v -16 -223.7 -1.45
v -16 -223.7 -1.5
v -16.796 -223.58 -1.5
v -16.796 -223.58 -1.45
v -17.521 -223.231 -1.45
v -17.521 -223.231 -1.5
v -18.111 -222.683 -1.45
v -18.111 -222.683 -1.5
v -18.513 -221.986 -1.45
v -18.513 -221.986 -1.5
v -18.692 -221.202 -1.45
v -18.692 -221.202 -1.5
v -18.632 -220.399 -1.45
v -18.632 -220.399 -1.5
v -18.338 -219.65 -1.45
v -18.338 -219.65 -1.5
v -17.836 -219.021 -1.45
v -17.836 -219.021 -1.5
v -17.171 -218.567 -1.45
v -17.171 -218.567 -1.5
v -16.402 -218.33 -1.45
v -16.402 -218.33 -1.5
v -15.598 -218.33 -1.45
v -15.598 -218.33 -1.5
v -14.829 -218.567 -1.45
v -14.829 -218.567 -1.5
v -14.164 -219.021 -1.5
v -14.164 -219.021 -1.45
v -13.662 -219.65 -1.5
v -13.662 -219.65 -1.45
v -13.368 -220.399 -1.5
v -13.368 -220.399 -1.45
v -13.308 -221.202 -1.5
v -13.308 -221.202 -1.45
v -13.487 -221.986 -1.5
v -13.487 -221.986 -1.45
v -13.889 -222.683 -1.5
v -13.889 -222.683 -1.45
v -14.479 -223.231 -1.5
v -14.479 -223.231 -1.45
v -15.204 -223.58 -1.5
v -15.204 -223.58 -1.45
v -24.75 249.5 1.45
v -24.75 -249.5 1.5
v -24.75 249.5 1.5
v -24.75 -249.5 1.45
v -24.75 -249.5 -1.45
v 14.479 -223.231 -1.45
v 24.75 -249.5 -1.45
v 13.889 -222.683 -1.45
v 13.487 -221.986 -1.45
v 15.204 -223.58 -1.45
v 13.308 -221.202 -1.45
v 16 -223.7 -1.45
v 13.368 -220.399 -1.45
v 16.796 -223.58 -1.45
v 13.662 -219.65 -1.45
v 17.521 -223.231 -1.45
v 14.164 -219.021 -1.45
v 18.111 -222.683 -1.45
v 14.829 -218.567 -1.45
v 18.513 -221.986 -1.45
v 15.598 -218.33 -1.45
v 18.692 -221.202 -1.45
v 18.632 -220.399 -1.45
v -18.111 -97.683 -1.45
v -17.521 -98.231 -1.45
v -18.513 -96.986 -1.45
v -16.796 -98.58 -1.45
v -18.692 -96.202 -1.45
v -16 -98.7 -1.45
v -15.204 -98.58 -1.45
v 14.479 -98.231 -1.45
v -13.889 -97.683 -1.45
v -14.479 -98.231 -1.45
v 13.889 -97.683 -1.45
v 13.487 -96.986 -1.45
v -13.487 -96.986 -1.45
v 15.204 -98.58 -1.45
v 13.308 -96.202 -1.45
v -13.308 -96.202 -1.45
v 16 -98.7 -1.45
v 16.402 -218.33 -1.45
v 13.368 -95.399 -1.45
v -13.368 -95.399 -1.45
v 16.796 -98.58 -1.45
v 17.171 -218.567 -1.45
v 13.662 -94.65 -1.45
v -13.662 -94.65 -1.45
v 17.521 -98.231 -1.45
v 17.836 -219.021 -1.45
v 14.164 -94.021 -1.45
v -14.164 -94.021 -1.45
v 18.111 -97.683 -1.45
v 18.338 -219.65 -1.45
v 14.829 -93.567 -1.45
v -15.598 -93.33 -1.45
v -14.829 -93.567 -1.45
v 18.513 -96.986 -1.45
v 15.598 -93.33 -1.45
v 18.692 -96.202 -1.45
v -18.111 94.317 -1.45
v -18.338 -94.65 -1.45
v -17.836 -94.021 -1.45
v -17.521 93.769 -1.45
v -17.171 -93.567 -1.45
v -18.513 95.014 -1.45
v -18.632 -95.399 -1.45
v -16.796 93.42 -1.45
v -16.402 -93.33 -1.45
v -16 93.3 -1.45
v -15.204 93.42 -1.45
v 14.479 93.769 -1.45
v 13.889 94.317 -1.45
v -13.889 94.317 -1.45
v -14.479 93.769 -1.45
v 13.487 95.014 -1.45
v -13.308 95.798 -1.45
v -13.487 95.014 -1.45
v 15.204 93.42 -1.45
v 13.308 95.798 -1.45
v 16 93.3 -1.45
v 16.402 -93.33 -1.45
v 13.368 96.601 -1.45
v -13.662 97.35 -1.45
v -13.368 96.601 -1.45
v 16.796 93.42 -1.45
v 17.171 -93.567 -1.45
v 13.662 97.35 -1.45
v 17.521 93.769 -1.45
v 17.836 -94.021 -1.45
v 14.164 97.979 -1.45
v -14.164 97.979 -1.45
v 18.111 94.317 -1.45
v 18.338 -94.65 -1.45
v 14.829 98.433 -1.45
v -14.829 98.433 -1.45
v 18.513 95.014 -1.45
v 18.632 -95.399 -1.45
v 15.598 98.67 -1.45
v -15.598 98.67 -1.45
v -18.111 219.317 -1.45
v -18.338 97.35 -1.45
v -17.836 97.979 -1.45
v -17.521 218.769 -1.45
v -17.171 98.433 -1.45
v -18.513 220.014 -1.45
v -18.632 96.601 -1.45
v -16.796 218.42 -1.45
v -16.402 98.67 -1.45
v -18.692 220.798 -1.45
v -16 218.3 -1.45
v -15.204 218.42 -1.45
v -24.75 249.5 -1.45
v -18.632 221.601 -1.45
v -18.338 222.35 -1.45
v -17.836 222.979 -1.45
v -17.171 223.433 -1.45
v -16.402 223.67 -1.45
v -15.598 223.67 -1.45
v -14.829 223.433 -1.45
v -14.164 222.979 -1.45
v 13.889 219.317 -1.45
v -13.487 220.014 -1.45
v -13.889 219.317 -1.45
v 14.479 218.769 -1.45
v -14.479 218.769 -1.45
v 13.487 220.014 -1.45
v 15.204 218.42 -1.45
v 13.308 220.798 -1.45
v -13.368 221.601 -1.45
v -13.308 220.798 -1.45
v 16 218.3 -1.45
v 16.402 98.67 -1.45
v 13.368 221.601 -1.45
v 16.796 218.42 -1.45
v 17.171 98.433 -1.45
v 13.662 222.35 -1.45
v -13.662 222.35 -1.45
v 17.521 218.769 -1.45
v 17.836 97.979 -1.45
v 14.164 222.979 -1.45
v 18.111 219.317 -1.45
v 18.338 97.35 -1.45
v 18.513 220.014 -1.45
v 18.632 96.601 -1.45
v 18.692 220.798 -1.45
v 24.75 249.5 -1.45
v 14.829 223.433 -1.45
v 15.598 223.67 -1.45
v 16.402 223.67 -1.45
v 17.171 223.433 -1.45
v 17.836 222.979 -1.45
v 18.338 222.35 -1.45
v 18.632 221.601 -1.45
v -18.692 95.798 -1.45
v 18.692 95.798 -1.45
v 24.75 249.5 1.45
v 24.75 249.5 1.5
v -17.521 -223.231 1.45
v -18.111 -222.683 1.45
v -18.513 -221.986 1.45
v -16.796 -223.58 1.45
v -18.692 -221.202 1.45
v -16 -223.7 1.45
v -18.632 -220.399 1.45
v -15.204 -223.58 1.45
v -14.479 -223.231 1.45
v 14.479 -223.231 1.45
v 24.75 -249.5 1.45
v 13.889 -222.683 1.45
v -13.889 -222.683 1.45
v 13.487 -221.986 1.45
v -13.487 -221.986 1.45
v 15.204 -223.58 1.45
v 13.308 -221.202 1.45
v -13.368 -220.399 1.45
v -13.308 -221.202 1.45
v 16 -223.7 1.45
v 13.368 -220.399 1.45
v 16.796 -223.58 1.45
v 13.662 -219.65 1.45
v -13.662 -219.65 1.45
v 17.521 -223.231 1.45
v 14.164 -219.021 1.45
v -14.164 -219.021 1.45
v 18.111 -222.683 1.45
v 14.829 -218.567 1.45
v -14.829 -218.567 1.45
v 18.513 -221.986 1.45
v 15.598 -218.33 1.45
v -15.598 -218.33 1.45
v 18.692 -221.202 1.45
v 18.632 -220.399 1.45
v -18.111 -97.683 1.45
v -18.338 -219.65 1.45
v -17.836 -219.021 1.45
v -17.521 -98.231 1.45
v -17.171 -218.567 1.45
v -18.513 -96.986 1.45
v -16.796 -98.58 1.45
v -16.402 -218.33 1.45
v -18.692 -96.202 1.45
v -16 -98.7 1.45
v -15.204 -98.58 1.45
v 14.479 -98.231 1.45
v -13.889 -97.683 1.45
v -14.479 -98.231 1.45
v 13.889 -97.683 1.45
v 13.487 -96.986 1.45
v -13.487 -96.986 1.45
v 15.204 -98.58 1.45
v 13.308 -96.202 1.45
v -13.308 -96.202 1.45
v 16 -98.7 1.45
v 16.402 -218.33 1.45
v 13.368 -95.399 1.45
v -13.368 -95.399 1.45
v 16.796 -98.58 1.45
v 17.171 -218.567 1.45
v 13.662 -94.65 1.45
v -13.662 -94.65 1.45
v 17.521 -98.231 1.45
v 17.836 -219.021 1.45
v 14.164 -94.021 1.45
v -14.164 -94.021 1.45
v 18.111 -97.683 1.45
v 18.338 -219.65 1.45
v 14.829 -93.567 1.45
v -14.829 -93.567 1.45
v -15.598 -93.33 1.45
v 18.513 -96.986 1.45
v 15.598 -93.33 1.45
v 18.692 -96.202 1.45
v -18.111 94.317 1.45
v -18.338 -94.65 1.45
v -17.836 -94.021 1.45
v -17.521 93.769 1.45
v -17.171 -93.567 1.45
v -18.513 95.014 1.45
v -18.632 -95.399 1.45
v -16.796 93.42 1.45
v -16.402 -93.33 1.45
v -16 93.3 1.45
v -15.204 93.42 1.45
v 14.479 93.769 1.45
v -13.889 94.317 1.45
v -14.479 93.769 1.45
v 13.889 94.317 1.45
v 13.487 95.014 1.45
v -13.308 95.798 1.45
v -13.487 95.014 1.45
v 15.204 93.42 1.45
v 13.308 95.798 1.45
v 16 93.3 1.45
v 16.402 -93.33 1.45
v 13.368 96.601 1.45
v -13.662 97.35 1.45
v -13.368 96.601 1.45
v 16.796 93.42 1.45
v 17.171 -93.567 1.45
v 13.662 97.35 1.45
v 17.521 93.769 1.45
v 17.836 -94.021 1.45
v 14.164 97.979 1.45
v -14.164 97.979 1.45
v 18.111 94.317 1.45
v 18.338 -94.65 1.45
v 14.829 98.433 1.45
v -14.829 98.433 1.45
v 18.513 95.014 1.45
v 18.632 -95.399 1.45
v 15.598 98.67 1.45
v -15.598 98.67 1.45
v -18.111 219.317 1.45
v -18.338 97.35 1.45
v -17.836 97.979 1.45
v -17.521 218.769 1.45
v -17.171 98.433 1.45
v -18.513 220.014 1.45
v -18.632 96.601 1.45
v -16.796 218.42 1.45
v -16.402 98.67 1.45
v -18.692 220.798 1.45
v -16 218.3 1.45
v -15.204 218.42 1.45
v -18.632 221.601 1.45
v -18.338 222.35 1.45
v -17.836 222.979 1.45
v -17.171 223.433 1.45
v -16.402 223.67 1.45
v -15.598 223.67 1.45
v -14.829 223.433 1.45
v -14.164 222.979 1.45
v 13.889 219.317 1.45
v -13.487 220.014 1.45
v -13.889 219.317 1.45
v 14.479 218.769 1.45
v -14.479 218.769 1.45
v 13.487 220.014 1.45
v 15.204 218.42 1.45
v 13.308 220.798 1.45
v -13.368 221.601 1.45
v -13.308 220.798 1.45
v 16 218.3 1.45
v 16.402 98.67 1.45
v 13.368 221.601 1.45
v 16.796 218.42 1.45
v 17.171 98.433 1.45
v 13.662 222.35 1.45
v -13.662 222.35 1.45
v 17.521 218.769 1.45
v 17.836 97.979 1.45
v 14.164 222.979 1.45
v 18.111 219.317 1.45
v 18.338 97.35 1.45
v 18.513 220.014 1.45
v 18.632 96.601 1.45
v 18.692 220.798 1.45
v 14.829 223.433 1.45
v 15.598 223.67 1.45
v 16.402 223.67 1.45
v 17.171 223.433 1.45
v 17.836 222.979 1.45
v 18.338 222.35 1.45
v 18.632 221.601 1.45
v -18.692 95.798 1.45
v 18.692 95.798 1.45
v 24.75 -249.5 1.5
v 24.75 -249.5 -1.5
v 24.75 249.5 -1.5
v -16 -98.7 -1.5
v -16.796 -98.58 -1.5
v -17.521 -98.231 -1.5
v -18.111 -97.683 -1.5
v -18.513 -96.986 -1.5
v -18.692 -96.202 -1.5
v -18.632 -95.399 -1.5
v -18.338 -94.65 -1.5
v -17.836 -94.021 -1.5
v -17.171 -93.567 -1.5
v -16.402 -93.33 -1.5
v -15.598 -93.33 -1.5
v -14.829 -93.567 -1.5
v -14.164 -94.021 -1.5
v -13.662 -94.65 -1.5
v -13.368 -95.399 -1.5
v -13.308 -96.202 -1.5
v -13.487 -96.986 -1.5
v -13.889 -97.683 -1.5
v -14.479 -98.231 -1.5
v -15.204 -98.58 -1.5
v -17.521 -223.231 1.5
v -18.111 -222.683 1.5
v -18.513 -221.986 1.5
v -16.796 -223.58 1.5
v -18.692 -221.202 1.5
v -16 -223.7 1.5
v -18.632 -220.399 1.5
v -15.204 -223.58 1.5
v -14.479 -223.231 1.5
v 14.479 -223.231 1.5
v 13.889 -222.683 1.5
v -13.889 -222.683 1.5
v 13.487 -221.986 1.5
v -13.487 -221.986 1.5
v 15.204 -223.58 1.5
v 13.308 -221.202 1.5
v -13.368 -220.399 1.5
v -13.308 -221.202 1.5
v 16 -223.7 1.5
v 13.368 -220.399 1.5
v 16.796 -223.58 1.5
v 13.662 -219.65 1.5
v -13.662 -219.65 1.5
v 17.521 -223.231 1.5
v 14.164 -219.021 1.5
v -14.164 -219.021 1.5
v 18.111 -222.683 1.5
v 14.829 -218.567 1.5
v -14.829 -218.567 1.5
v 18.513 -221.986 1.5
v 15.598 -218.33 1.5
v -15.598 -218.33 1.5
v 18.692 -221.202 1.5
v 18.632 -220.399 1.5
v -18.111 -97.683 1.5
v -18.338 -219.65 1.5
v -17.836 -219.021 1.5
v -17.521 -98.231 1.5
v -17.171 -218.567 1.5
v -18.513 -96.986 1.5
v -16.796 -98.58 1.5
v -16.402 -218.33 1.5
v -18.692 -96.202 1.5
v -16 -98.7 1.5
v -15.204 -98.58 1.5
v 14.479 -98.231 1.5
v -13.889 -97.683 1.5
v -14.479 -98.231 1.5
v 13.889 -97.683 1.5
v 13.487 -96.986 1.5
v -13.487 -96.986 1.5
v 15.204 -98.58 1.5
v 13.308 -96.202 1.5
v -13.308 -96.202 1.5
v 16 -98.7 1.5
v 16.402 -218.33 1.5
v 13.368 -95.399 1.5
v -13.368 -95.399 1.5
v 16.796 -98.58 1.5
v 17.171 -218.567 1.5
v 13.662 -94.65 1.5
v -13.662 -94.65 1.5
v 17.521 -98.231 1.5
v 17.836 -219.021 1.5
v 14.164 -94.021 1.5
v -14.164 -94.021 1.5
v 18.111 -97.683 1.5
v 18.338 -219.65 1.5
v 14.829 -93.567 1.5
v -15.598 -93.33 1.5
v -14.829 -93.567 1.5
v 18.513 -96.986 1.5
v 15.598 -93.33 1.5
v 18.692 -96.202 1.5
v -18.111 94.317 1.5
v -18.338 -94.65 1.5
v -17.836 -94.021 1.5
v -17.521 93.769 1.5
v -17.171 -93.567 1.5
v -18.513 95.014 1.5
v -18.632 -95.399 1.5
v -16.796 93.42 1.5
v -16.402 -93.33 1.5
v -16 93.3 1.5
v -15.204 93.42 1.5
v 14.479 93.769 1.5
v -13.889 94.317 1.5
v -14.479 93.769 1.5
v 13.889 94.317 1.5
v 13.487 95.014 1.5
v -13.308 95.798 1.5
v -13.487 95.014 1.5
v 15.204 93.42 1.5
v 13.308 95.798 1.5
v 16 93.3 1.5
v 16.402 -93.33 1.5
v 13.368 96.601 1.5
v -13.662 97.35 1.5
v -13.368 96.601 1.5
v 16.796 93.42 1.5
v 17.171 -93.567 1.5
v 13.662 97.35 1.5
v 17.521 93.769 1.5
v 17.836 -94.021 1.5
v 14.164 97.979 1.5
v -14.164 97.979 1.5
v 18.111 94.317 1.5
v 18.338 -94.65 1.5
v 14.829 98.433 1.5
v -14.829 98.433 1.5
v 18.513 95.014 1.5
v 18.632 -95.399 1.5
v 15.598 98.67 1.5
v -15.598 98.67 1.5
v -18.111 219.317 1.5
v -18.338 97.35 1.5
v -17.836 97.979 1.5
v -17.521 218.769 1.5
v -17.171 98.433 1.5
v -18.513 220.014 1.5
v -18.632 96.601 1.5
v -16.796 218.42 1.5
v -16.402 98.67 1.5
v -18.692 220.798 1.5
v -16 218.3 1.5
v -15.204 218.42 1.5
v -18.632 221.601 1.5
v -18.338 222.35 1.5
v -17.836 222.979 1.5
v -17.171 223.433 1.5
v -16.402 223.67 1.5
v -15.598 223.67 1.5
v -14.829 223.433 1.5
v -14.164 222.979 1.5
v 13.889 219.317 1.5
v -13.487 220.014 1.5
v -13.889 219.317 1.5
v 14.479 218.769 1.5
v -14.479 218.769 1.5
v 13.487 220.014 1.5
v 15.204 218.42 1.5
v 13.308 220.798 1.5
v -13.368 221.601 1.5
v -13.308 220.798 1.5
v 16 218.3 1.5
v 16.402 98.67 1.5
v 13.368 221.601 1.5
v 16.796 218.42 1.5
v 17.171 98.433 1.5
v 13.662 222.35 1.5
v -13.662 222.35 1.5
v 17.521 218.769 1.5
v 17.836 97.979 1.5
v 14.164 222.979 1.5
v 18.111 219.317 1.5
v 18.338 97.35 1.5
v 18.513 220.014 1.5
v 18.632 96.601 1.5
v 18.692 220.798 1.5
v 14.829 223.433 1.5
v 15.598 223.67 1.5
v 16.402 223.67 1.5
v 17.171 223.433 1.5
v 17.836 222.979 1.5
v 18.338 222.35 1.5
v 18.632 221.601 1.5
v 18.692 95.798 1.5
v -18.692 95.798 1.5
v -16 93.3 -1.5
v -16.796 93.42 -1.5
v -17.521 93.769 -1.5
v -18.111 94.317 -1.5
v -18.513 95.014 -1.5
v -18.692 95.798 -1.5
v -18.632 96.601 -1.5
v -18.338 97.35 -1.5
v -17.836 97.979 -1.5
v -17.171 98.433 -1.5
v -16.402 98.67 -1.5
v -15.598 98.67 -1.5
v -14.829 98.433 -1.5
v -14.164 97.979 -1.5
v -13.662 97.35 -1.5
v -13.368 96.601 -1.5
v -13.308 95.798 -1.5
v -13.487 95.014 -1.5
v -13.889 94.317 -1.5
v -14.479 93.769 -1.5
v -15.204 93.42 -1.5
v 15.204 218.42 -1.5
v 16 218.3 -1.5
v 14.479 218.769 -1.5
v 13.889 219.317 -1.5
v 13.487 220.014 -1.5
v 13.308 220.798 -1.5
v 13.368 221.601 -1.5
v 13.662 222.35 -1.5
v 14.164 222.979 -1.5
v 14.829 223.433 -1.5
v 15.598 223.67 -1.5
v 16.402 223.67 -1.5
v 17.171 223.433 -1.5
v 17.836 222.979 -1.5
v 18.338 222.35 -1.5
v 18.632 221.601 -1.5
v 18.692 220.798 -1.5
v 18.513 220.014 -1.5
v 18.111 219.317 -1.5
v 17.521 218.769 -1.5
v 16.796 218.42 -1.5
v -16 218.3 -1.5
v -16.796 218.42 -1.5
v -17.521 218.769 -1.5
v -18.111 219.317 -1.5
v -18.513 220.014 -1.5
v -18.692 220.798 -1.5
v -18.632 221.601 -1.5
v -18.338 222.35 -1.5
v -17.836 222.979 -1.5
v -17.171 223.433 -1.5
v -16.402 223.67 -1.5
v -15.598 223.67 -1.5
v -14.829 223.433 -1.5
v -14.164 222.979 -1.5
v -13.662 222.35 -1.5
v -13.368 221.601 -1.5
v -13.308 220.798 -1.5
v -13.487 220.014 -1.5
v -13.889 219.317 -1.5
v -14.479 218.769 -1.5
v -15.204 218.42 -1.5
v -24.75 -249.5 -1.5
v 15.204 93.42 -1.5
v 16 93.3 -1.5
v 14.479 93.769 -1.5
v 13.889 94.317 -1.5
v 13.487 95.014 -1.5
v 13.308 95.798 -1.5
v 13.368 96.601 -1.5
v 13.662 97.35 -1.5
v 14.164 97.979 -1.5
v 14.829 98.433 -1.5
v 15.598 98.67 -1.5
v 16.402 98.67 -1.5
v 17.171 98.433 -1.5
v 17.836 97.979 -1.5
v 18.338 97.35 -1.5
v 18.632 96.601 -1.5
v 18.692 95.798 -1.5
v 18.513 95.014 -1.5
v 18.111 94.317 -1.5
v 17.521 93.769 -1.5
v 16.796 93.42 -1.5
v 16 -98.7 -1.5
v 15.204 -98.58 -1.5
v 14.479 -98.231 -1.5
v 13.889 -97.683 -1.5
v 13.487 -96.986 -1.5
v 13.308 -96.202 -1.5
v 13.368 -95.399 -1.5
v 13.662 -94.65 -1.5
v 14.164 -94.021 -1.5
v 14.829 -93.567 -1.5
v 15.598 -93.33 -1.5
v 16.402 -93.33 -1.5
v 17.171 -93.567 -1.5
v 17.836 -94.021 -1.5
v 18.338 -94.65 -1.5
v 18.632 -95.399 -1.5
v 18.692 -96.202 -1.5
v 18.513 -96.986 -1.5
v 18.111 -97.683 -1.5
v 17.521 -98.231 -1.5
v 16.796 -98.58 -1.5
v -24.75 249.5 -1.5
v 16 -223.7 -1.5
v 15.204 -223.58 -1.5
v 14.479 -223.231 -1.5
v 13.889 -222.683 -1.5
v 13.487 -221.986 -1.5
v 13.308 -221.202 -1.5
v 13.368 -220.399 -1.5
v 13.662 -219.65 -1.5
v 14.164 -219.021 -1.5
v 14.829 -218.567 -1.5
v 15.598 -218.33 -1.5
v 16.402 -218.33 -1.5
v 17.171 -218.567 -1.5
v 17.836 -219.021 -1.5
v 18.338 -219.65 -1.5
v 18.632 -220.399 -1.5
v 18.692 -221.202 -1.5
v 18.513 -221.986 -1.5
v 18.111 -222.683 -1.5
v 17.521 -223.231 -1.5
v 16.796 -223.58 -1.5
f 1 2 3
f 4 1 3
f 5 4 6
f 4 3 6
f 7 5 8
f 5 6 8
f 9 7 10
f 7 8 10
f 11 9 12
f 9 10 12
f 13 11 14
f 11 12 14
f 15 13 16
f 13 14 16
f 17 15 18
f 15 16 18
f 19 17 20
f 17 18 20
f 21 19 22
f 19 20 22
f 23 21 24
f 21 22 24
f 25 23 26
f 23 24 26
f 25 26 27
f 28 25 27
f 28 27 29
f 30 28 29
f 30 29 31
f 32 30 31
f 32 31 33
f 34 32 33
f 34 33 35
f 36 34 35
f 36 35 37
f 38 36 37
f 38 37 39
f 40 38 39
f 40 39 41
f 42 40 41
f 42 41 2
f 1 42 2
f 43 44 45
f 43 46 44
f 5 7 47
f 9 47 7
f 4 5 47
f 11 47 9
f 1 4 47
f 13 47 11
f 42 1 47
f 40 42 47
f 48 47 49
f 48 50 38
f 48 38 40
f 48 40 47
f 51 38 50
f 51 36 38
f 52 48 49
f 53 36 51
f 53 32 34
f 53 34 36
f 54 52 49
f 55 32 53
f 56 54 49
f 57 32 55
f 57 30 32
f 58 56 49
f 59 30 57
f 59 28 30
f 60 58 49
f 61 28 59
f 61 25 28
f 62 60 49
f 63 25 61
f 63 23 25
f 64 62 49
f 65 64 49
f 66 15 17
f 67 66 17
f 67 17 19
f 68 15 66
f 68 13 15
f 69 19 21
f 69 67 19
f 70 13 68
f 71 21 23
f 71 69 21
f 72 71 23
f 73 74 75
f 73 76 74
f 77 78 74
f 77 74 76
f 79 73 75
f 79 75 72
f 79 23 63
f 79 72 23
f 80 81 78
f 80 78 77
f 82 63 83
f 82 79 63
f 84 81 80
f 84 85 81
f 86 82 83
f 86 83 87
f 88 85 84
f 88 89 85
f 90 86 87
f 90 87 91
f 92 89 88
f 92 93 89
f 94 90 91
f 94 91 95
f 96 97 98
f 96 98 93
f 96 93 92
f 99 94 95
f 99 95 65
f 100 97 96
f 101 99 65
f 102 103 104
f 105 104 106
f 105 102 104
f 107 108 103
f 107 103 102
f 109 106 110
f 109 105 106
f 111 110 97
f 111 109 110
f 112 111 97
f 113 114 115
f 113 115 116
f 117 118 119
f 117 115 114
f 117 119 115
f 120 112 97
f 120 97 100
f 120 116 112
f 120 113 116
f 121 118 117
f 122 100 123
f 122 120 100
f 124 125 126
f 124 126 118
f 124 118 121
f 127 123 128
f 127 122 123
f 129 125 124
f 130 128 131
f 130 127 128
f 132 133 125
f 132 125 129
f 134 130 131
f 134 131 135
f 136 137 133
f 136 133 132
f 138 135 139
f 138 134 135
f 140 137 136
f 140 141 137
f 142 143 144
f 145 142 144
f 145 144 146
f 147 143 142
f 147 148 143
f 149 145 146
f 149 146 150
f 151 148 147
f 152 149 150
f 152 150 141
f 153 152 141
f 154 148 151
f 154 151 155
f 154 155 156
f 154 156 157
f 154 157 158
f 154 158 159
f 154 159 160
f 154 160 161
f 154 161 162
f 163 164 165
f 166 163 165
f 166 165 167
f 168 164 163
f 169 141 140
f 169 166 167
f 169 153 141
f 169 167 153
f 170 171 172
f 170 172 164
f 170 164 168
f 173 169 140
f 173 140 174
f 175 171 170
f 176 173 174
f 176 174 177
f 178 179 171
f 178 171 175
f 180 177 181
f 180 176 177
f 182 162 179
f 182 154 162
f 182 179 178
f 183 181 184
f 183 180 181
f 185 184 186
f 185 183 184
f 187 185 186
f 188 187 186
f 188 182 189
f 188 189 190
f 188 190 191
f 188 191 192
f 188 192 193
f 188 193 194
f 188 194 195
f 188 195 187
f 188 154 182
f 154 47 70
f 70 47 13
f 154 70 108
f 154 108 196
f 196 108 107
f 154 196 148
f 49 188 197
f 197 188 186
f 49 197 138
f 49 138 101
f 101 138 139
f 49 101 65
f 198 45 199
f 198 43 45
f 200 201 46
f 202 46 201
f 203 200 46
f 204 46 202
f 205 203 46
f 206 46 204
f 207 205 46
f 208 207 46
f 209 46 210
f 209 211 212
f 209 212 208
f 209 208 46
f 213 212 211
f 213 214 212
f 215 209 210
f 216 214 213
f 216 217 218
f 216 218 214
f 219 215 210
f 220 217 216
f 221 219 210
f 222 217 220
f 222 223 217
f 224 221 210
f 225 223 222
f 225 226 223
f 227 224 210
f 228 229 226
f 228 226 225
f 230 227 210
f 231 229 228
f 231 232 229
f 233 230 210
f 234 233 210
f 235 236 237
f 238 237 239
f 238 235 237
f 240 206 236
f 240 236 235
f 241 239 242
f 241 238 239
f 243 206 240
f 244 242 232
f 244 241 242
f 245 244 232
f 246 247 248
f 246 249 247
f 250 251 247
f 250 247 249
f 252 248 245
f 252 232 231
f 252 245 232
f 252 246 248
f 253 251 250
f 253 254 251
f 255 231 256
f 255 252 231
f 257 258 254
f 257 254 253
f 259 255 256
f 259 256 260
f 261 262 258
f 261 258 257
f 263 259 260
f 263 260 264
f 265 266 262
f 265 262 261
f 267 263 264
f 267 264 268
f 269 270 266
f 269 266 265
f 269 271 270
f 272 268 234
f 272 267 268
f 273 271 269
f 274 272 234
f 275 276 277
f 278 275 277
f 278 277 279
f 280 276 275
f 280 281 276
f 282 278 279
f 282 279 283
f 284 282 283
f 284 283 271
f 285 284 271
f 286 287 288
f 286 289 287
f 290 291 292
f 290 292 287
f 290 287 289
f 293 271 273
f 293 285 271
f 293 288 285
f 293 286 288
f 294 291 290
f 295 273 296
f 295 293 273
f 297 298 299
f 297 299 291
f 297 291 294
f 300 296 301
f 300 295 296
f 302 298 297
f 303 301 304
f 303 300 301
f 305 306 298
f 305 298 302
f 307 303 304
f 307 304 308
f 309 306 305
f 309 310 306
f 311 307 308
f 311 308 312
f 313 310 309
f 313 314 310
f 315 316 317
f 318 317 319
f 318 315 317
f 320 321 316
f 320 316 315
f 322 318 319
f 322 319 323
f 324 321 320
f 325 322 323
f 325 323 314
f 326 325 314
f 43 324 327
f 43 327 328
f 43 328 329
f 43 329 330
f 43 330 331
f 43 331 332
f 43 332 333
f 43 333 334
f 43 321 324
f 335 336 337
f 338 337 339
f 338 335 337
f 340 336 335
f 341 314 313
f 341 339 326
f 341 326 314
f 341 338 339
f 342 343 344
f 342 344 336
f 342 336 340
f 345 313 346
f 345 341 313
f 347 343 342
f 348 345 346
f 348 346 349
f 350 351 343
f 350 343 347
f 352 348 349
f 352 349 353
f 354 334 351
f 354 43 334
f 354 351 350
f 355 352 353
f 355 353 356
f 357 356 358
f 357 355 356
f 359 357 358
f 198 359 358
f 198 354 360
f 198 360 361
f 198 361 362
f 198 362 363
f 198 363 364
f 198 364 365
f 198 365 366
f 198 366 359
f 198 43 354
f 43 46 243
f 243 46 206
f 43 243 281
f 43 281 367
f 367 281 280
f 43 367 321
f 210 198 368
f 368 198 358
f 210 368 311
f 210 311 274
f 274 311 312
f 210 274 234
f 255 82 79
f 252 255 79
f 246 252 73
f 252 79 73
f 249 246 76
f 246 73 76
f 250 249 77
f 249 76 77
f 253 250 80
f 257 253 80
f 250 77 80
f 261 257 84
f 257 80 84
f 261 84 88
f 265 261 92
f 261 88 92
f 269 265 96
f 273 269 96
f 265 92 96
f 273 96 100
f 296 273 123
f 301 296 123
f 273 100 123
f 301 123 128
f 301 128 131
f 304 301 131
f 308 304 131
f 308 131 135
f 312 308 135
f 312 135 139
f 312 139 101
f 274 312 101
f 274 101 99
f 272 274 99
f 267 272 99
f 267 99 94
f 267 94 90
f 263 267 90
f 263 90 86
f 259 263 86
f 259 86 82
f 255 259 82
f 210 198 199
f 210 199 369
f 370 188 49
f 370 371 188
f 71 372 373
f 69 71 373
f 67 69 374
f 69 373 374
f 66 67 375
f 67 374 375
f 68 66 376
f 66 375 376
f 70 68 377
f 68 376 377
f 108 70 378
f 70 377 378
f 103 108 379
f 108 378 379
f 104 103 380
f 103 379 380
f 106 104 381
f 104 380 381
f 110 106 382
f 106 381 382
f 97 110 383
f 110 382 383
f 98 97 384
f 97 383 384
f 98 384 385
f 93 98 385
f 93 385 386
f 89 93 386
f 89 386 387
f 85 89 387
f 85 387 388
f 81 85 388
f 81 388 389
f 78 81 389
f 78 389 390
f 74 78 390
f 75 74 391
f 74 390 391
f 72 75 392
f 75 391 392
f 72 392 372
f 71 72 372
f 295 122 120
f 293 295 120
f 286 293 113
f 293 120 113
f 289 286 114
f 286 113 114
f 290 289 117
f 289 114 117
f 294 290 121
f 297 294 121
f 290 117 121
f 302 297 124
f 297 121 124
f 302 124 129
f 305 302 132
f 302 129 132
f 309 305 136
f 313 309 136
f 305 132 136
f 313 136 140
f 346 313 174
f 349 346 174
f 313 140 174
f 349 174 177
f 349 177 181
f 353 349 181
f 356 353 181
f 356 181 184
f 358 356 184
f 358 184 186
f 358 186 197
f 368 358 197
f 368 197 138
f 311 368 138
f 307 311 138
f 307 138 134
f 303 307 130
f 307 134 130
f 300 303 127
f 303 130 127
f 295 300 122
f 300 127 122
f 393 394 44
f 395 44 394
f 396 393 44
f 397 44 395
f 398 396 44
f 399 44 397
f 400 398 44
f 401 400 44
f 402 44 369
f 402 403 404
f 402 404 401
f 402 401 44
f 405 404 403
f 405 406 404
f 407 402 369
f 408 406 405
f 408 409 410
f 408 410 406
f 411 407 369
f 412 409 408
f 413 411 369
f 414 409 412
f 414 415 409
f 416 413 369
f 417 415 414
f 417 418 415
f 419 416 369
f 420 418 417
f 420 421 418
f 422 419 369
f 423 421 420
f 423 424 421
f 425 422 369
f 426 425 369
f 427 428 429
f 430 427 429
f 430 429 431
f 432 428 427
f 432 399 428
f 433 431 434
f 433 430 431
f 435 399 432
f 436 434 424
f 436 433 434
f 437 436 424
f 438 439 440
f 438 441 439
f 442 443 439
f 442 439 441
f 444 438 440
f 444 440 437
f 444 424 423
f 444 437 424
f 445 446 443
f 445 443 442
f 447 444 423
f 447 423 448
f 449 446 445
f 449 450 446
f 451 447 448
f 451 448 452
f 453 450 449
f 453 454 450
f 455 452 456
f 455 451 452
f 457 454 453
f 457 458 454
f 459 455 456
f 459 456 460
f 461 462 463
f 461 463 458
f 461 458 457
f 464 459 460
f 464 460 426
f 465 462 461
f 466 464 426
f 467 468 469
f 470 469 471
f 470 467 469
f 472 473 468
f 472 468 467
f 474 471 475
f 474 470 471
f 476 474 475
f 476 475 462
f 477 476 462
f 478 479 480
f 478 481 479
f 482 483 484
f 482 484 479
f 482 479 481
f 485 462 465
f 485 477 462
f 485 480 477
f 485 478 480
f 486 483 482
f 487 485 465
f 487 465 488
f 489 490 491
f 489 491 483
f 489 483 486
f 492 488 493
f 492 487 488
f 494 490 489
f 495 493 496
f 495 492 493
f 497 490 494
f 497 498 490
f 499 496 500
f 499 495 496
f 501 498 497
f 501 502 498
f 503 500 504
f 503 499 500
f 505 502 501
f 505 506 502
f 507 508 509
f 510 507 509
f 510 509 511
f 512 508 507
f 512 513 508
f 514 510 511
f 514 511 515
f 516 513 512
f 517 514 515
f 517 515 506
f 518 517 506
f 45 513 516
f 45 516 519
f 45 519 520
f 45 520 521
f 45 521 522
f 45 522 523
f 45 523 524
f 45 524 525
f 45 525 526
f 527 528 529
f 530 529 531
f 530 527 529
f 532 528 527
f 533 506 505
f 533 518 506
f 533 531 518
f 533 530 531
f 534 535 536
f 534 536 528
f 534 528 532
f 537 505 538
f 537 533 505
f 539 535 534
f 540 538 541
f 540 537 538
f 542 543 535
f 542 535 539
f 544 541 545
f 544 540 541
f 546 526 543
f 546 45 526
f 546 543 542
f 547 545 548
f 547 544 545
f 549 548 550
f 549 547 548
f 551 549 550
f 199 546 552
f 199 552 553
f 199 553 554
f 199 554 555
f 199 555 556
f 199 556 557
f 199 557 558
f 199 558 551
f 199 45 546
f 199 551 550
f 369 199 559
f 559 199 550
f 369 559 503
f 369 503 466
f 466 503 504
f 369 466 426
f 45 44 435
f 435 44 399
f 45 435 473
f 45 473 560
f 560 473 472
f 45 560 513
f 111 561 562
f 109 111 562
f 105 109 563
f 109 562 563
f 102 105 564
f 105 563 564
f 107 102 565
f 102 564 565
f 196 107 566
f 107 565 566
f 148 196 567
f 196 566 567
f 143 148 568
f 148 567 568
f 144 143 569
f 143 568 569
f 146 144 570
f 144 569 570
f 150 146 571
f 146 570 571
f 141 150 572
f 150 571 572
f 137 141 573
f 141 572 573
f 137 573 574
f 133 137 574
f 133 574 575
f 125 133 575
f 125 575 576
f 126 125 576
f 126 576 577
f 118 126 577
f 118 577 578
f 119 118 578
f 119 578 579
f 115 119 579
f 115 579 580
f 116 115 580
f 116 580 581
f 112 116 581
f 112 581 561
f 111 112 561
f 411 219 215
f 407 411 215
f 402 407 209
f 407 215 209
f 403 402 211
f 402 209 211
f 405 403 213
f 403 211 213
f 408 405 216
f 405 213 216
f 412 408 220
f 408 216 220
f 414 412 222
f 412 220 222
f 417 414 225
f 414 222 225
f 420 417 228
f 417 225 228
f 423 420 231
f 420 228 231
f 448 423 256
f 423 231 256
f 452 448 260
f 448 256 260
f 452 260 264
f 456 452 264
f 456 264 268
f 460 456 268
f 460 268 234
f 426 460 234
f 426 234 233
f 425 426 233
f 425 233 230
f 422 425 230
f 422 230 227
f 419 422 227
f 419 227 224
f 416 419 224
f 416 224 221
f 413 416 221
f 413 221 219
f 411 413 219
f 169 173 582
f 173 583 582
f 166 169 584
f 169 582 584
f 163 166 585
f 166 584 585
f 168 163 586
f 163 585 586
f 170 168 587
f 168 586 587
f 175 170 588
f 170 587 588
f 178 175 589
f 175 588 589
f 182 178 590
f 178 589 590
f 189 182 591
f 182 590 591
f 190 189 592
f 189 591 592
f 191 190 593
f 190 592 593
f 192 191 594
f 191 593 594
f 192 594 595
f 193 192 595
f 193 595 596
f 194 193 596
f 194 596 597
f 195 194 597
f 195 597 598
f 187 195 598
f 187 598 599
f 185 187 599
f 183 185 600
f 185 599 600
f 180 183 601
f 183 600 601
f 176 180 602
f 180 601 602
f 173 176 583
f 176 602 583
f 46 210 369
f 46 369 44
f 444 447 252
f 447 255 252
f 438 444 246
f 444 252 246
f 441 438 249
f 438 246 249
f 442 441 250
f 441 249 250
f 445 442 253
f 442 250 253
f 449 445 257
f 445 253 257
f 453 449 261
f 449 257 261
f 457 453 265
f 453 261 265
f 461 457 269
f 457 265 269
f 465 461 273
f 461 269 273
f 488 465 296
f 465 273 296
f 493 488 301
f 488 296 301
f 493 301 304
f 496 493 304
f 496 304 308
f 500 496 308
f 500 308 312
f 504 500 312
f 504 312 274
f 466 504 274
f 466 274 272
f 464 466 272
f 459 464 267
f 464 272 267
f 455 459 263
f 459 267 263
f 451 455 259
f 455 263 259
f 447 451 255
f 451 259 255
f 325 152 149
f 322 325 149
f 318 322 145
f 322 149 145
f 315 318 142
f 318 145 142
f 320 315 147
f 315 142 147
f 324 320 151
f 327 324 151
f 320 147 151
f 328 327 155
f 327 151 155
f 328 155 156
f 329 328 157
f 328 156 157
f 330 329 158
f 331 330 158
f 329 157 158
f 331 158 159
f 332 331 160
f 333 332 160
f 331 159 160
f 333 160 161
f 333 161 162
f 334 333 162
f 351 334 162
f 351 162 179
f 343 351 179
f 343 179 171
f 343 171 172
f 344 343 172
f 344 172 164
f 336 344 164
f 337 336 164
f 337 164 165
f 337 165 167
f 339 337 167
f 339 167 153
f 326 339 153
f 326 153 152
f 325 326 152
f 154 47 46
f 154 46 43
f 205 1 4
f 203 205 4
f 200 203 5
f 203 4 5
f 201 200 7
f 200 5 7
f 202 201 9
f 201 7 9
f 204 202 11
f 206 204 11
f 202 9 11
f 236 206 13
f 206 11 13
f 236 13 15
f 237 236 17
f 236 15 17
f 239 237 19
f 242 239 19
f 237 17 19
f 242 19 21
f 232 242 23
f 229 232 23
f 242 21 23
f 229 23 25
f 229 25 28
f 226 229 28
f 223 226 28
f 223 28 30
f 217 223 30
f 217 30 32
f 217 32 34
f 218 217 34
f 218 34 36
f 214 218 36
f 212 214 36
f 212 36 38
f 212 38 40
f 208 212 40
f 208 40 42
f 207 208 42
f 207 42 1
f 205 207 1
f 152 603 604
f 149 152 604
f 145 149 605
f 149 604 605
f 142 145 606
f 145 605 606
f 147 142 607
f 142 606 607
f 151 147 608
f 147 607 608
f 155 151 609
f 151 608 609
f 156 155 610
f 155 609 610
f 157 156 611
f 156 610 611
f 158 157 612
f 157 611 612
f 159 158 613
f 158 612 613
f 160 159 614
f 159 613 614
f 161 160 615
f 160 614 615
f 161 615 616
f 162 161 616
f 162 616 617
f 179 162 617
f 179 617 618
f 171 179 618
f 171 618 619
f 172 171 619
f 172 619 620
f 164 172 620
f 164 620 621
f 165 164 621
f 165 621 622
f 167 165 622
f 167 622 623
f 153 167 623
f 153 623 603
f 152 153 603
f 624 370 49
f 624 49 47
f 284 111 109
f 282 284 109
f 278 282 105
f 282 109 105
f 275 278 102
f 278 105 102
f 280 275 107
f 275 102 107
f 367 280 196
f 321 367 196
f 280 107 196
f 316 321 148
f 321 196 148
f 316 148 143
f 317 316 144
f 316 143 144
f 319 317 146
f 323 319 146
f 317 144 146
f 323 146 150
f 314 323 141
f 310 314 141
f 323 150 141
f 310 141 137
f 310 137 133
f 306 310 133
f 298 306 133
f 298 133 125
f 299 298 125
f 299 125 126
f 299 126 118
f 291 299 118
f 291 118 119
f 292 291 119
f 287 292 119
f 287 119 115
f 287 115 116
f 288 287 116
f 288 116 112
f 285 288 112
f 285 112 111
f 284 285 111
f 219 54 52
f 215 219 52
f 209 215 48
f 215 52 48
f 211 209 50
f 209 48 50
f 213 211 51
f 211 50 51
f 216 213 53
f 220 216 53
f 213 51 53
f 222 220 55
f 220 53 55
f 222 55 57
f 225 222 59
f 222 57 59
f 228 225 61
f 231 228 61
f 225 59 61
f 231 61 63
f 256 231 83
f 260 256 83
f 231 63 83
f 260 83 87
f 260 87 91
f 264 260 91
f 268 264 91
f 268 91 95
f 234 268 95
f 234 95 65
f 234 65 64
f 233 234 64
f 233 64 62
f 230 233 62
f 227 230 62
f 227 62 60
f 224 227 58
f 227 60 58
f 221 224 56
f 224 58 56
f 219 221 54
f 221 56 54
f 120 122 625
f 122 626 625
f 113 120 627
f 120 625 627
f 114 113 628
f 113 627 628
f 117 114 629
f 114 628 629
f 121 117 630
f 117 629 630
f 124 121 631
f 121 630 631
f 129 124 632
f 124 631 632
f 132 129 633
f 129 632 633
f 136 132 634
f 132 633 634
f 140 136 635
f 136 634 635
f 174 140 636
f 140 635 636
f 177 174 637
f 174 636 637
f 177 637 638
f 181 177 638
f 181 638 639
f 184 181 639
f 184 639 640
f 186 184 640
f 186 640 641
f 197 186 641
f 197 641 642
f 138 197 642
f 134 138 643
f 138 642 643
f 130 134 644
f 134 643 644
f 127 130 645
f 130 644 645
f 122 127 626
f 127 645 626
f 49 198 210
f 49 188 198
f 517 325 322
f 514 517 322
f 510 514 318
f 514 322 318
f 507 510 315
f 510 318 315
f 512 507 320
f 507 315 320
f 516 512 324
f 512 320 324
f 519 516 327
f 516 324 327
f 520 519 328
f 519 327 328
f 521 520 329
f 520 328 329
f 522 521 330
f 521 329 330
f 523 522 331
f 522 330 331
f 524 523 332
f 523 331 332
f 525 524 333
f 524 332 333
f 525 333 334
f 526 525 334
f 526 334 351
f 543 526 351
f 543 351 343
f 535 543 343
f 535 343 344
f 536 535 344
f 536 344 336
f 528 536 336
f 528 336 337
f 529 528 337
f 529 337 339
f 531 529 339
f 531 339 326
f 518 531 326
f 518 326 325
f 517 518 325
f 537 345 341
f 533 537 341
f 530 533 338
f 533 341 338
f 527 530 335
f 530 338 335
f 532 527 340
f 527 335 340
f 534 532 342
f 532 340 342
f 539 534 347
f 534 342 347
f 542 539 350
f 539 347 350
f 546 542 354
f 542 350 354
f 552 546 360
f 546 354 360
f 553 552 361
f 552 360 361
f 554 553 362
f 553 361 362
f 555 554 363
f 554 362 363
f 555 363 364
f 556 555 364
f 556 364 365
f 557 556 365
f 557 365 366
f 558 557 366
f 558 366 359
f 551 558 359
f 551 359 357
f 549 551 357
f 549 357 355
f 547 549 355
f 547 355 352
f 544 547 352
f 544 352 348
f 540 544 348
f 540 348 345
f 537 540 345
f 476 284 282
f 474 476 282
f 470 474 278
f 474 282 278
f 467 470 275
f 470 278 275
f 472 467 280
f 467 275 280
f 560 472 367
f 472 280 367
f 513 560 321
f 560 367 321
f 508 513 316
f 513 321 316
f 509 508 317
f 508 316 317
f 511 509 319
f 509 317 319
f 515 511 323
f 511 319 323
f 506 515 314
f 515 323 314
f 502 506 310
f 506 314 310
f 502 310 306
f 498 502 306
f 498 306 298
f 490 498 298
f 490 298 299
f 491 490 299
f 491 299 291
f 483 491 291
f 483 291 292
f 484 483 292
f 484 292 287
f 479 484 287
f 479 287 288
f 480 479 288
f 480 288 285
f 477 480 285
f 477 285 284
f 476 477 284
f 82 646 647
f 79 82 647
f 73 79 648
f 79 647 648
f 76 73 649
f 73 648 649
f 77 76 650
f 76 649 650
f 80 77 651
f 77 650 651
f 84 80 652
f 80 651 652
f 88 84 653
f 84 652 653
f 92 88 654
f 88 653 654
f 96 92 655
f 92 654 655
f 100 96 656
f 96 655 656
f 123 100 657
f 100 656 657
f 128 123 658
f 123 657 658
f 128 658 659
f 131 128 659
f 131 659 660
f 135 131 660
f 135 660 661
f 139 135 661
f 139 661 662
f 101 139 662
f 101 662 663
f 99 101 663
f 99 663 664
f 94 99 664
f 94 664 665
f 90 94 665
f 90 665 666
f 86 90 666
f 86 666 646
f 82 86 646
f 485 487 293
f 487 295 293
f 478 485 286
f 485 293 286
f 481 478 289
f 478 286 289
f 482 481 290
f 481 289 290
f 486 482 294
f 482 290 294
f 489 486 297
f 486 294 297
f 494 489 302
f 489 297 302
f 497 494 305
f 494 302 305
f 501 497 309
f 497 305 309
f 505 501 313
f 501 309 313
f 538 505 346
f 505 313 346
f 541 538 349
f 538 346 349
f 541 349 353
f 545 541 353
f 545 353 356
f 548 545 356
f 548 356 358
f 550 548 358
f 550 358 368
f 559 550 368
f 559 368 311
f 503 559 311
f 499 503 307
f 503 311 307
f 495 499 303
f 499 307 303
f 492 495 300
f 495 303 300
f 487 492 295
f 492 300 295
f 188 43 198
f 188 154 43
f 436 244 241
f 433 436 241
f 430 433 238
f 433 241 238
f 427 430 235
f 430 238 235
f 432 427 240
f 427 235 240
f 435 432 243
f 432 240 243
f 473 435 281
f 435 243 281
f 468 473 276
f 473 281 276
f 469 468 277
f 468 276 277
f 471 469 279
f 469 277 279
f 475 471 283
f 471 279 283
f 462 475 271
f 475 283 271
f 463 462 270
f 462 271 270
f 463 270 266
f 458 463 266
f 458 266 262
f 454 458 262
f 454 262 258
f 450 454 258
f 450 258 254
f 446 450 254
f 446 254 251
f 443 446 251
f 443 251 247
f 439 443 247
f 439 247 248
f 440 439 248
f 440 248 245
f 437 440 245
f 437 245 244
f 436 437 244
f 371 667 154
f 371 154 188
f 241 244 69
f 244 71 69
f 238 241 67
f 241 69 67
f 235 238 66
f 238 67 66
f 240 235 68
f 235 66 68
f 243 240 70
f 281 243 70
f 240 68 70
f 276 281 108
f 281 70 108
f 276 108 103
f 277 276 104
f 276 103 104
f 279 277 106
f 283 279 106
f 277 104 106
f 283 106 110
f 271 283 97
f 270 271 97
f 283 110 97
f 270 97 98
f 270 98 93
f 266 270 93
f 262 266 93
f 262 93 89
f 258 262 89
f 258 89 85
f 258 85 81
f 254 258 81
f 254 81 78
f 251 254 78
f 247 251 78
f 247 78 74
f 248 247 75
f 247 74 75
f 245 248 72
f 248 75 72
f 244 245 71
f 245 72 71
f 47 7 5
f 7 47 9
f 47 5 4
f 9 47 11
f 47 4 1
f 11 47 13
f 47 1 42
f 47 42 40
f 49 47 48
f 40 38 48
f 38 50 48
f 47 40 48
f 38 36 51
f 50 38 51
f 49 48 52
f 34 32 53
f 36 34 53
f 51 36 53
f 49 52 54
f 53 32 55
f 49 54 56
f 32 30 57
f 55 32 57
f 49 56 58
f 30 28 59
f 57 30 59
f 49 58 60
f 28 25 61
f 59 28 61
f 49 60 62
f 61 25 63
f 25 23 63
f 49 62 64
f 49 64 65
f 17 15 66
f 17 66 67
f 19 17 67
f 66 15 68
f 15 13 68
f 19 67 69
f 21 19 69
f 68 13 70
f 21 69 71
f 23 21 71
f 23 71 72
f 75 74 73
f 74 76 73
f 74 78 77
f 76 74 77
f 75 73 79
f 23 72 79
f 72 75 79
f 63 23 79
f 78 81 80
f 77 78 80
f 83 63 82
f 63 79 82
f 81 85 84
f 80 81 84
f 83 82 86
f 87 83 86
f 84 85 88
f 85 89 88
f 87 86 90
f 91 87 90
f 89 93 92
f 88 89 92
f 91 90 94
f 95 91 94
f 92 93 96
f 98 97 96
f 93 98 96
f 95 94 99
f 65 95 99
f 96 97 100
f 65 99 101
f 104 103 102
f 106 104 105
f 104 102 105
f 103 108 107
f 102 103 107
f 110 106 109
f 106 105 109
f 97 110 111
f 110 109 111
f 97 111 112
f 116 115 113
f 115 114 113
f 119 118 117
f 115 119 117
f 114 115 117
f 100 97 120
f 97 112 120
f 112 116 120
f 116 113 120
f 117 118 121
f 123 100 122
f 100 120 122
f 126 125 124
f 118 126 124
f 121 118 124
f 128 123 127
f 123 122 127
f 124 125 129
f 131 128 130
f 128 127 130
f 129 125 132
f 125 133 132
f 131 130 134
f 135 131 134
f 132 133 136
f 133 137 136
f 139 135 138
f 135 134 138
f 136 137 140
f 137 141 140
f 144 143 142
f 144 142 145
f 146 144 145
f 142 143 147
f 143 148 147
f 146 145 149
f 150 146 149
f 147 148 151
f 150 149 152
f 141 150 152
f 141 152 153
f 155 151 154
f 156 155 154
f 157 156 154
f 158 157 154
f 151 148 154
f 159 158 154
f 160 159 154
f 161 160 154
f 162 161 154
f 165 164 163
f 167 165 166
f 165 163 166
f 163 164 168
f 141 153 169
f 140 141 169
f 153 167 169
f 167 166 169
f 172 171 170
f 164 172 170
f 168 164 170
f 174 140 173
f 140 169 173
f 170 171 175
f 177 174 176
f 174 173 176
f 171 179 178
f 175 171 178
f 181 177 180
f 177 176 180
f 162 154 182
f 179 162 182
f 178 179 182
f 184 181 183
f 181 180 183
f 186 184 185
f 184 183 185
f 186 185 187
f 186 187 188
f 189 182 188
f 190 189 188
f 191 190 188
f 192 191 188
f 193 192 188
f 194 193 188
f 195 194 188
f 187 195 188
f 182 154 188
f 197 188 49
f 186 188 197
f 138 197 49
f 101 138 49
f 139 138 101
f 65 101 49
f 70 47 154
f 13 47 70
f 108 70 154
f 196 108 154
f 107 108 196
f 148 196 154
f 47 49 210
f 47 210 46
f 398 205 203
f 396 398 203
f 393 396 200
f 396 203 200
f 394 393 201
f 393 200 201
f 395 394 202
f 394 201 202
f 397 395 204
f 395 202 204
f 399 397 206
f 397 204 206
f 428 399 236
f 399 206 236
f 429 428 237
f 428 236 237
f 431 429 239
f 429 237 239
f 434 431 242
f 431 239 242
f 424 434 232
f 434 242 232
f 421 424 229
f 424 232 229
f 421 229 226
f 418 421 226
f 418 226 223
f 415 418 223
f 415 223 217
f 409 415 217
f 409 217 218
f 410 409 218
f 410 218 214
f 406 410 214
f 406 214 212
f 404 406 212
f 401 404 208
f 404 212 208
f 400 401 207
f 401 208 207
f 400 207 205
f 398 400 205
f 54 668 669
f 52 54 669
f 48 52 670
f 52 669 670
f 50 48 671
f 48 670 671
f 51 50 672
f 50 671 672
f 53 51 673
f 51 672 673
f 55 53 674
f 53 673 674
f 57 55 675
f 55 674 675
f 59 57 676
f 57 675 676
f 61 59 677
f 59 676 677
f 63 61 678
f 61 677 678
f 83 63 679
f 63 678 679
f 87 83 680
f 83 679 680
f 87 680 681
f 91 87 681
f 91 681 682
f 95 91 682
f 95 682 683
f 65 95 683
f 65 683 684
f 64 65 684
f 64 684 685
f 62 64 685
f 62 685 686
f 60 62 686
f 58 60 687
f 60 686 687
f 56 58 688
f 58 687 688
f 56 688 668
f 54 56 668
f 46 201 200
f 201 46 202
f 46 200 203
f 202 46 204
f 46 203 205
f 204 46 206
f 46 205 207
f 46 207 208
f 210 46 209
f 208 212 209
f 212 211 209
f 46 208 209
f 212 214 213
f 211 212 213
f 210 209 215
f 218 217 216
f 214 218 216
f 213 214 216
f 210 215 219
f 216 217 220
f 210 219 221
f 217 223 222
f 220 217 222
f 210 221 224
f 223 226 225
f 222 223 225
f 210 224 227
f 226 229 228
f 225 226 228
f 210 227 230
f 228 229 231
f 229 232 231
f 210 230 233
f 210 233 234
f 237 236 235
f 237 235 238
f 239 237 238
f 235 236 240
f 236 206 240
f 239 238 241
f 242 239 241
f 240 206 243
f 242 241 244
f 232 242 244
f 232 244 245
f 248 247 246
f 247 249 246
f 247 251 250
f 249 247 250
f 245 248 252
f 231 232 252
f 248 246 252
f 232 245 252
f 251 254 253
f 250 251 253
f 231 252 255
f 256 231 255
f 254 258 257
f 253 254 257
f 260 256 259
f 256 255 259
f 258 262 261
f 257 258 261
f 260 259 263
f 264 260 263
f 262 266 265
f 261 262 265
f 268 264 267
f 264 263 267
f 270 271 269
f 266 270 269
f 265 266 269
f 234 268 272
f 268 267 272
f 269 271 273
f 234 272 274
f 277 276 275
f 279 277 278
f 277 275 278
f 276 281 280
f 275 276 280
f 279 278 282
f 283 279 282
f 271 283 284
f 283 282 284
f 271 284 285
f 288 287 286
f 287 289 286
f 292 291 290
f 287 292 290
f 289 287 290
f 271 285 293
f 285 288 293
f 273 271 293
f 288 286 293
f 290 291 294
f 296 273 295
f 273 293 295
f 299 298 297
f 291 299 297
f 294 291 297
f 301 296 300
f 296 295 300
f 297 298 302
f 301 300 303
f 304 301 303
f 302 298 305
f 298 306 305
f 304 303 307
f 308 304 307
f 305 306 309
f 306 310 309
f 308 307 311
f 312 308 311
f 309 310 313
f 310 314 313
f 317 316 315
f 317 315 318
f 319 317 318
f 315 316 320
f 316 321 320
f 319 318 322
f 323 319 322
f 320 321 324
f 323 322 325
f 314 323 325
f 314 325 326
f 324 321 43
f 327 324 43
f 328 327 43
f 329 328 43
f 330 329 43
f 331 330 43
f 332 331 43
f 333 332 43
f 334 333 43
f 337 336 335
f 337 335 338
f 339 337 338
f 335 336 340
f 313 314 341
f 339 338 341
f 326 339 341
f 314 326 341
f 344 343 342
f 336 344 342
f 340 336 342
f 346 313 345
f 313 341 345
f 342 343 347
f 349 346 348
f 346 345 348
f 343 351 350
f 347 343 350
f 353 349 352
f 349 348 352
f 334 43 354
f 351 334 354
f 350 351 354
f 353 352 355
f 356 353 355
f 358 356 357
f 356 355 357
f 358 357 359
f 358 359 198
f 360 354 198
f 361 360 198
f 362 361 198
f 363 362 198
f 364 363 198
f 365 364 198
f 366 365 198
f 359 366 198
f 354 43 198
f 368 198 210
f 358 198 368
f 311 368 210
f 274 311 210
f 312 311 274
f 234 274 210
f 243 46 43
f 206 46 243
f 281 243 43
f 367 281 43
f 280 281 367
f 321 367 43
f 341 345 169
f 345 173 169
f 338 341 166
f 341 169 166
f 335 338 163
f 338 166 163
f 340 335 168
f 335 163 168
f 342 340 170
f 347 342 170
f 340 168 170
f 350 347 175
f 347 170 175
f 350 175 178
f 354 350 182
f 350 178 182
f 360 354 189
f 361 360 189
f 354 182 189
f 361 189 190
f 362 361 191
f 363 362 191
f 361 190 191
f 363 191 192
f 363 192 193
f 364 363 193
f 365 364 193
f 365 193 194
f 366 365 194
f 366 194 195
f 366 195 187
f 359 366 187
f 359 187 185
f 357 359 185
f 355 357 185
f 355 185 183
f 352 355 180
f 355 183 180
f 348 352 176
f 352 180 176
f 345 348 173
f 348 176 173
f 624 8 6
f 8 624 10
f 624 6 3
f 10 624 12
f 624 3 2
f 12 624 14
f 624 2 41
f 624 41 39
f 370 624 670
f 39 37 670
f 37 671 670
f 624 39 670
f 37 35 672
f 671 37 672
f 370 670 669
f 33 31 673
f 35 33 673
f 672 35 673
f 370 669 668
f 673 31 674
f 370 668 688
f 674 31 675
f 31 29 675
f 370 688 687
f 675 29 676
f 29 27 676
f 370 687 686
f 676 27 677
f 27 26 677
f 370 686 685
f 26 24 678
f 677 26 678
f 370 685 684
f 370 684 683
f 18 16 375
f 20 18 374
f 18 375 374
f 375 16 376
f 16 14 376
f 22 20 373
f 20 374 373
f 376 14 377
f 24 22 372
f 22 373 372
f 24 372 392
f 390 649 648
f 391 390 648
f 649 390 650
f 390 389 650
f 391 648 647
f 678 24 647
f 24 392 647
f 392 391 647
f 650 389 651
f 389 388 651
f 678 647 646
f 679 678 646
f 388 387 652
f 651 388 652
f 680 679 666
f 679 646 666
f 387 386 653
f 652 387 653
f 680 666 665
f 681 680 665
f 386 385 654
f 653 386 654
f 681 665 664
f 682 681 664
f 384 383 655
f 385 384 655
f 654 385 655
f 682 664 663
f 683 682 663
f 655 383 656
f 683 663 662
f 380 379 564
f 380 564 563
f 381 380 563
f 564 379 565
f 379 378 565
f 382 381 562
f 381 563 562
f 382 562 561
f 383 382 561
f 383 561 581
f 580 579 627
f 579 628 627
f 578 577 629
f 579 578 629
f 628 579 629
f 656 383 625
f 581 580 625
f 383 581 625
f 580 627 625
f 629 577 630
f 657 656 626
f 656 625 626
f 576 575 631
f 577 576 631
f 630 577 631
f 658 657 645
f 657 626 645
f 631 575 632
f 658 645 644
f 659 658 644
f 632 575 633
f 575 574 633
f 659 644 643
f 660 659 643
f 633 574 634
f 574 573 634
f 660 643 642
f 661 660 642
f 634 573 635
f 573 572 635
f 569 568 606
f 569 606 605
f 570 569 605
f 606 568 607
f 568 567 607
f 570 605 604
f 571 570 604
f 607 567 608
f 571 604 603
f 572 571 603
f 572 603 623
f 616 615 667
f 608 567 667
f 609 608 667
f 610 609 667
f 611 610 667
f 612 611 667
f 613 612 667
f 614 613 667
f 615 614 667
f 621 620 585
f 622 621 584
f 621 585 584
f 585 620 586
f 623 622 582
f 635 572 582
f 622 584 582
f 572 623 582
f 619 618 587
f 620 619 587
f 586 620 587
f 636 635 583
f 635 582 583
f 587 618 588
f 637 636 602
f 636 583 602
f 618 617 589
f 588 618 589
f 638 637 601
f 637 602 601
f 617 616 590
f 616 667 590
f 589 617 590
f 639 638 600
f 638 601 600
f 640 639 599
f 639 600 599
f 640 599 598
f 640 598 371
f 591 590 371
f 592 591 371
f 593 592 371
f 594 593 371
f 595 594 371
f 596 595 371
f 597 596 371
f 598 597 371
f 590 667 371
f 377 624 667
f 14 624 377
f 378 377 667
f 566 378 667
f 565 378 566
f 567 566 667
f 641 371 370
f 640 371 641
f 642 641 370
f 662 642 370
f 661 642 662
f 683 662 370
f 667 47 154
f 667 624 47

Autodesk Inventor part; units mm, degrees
ref_plane "YZ Plane" through (0, 0, 0) normal (1, 0, 0) x (0, 1, 0)
ref_plane "XZ Plane" through (0, 0, 0) normal (0, 1, 0) x (-1, 0, 0)
ref_plane "XY Plane" through (0, 0, 0) normal (0, 0, 1) x (1, 0, 0)
sketch "Sketch1" plane through (0, 0, 0) normal (0, 0, 1) x (1, 0, 0)
  line L0 (24.75, -249.5) -> (-24.75, -249.5)
  line L1 (-24.75, -249.5) -> (-24.75, 249.5)
  line L2 (-24.75, 249.5) -> (24.75, 249.5)
  line L3 (24.75, 249.5) -> (24.75, -249.5)
  line L4 (24.75, -249.5) -> (-24.75, 249.5) construction
  line L5 (-24.75, -249.5) -> (24.75, 249.5) construction
  point P0 (0, 0)
  dimension "d0" = 49.5
  dimension "d1" = 499
extrude "Extrusion1" add sketch "Sketch1" along normal mid plane 3
extrude "Extrusion2" cut sketch "Sketch1" along normal mid plane 2.9
extrude "Extrusion3" add sketch "Sketch1" along normal mid plane 2.9 separate body
sketch "Sketch2" plane through (0, 0, 1.5) normal (0, 0, 1) x (1, 0, 0)
  line L0 (16, -221) -> (-16, -221)
  line L1 (-16, -221) -> (-16, 221)
  line L2 (-16, 221) -> (16, 221)
  line L3 (16, 221) -> (16, -221)
  line L4 (16, -221) -> (-16, 221) construction
  line L5 (-16, -221) -> (16, 221) construction
  line L6 (16, -96) -> (-16, -96)
  line L7 (-16, -96) -> (-16, 96)
  line L8 (-16, 96) -> (16, 96)
  line L9 (16, 96) -> (16, -96)
  line L10 (16, -96) -> (-16, 96) construction
  line L11 (-16, -96) -> (16, 96) construction
  line L12 (-24.75, -249.5) -> (24.75, -249.5) projected
  point P0 (0, 0)
  dimension "d8" = 32
  dimension "d10" = 442
  dimension "d11" = 125
hole "Hole1" at (-16, 221, 1.5) at (16, 221, 1.5) at (-16, 96, 1.5) at (16, 96, 1.5) at (-16, -96, 1.5) at (16, -96, 1.5) at (16, -221, 1.5) at (-16, -221, 1.5) direction (0, 0, -1) diameter 5.4 end through all bodies 1 2
properties part number "Narrow Internal Vertical Side Panels"
